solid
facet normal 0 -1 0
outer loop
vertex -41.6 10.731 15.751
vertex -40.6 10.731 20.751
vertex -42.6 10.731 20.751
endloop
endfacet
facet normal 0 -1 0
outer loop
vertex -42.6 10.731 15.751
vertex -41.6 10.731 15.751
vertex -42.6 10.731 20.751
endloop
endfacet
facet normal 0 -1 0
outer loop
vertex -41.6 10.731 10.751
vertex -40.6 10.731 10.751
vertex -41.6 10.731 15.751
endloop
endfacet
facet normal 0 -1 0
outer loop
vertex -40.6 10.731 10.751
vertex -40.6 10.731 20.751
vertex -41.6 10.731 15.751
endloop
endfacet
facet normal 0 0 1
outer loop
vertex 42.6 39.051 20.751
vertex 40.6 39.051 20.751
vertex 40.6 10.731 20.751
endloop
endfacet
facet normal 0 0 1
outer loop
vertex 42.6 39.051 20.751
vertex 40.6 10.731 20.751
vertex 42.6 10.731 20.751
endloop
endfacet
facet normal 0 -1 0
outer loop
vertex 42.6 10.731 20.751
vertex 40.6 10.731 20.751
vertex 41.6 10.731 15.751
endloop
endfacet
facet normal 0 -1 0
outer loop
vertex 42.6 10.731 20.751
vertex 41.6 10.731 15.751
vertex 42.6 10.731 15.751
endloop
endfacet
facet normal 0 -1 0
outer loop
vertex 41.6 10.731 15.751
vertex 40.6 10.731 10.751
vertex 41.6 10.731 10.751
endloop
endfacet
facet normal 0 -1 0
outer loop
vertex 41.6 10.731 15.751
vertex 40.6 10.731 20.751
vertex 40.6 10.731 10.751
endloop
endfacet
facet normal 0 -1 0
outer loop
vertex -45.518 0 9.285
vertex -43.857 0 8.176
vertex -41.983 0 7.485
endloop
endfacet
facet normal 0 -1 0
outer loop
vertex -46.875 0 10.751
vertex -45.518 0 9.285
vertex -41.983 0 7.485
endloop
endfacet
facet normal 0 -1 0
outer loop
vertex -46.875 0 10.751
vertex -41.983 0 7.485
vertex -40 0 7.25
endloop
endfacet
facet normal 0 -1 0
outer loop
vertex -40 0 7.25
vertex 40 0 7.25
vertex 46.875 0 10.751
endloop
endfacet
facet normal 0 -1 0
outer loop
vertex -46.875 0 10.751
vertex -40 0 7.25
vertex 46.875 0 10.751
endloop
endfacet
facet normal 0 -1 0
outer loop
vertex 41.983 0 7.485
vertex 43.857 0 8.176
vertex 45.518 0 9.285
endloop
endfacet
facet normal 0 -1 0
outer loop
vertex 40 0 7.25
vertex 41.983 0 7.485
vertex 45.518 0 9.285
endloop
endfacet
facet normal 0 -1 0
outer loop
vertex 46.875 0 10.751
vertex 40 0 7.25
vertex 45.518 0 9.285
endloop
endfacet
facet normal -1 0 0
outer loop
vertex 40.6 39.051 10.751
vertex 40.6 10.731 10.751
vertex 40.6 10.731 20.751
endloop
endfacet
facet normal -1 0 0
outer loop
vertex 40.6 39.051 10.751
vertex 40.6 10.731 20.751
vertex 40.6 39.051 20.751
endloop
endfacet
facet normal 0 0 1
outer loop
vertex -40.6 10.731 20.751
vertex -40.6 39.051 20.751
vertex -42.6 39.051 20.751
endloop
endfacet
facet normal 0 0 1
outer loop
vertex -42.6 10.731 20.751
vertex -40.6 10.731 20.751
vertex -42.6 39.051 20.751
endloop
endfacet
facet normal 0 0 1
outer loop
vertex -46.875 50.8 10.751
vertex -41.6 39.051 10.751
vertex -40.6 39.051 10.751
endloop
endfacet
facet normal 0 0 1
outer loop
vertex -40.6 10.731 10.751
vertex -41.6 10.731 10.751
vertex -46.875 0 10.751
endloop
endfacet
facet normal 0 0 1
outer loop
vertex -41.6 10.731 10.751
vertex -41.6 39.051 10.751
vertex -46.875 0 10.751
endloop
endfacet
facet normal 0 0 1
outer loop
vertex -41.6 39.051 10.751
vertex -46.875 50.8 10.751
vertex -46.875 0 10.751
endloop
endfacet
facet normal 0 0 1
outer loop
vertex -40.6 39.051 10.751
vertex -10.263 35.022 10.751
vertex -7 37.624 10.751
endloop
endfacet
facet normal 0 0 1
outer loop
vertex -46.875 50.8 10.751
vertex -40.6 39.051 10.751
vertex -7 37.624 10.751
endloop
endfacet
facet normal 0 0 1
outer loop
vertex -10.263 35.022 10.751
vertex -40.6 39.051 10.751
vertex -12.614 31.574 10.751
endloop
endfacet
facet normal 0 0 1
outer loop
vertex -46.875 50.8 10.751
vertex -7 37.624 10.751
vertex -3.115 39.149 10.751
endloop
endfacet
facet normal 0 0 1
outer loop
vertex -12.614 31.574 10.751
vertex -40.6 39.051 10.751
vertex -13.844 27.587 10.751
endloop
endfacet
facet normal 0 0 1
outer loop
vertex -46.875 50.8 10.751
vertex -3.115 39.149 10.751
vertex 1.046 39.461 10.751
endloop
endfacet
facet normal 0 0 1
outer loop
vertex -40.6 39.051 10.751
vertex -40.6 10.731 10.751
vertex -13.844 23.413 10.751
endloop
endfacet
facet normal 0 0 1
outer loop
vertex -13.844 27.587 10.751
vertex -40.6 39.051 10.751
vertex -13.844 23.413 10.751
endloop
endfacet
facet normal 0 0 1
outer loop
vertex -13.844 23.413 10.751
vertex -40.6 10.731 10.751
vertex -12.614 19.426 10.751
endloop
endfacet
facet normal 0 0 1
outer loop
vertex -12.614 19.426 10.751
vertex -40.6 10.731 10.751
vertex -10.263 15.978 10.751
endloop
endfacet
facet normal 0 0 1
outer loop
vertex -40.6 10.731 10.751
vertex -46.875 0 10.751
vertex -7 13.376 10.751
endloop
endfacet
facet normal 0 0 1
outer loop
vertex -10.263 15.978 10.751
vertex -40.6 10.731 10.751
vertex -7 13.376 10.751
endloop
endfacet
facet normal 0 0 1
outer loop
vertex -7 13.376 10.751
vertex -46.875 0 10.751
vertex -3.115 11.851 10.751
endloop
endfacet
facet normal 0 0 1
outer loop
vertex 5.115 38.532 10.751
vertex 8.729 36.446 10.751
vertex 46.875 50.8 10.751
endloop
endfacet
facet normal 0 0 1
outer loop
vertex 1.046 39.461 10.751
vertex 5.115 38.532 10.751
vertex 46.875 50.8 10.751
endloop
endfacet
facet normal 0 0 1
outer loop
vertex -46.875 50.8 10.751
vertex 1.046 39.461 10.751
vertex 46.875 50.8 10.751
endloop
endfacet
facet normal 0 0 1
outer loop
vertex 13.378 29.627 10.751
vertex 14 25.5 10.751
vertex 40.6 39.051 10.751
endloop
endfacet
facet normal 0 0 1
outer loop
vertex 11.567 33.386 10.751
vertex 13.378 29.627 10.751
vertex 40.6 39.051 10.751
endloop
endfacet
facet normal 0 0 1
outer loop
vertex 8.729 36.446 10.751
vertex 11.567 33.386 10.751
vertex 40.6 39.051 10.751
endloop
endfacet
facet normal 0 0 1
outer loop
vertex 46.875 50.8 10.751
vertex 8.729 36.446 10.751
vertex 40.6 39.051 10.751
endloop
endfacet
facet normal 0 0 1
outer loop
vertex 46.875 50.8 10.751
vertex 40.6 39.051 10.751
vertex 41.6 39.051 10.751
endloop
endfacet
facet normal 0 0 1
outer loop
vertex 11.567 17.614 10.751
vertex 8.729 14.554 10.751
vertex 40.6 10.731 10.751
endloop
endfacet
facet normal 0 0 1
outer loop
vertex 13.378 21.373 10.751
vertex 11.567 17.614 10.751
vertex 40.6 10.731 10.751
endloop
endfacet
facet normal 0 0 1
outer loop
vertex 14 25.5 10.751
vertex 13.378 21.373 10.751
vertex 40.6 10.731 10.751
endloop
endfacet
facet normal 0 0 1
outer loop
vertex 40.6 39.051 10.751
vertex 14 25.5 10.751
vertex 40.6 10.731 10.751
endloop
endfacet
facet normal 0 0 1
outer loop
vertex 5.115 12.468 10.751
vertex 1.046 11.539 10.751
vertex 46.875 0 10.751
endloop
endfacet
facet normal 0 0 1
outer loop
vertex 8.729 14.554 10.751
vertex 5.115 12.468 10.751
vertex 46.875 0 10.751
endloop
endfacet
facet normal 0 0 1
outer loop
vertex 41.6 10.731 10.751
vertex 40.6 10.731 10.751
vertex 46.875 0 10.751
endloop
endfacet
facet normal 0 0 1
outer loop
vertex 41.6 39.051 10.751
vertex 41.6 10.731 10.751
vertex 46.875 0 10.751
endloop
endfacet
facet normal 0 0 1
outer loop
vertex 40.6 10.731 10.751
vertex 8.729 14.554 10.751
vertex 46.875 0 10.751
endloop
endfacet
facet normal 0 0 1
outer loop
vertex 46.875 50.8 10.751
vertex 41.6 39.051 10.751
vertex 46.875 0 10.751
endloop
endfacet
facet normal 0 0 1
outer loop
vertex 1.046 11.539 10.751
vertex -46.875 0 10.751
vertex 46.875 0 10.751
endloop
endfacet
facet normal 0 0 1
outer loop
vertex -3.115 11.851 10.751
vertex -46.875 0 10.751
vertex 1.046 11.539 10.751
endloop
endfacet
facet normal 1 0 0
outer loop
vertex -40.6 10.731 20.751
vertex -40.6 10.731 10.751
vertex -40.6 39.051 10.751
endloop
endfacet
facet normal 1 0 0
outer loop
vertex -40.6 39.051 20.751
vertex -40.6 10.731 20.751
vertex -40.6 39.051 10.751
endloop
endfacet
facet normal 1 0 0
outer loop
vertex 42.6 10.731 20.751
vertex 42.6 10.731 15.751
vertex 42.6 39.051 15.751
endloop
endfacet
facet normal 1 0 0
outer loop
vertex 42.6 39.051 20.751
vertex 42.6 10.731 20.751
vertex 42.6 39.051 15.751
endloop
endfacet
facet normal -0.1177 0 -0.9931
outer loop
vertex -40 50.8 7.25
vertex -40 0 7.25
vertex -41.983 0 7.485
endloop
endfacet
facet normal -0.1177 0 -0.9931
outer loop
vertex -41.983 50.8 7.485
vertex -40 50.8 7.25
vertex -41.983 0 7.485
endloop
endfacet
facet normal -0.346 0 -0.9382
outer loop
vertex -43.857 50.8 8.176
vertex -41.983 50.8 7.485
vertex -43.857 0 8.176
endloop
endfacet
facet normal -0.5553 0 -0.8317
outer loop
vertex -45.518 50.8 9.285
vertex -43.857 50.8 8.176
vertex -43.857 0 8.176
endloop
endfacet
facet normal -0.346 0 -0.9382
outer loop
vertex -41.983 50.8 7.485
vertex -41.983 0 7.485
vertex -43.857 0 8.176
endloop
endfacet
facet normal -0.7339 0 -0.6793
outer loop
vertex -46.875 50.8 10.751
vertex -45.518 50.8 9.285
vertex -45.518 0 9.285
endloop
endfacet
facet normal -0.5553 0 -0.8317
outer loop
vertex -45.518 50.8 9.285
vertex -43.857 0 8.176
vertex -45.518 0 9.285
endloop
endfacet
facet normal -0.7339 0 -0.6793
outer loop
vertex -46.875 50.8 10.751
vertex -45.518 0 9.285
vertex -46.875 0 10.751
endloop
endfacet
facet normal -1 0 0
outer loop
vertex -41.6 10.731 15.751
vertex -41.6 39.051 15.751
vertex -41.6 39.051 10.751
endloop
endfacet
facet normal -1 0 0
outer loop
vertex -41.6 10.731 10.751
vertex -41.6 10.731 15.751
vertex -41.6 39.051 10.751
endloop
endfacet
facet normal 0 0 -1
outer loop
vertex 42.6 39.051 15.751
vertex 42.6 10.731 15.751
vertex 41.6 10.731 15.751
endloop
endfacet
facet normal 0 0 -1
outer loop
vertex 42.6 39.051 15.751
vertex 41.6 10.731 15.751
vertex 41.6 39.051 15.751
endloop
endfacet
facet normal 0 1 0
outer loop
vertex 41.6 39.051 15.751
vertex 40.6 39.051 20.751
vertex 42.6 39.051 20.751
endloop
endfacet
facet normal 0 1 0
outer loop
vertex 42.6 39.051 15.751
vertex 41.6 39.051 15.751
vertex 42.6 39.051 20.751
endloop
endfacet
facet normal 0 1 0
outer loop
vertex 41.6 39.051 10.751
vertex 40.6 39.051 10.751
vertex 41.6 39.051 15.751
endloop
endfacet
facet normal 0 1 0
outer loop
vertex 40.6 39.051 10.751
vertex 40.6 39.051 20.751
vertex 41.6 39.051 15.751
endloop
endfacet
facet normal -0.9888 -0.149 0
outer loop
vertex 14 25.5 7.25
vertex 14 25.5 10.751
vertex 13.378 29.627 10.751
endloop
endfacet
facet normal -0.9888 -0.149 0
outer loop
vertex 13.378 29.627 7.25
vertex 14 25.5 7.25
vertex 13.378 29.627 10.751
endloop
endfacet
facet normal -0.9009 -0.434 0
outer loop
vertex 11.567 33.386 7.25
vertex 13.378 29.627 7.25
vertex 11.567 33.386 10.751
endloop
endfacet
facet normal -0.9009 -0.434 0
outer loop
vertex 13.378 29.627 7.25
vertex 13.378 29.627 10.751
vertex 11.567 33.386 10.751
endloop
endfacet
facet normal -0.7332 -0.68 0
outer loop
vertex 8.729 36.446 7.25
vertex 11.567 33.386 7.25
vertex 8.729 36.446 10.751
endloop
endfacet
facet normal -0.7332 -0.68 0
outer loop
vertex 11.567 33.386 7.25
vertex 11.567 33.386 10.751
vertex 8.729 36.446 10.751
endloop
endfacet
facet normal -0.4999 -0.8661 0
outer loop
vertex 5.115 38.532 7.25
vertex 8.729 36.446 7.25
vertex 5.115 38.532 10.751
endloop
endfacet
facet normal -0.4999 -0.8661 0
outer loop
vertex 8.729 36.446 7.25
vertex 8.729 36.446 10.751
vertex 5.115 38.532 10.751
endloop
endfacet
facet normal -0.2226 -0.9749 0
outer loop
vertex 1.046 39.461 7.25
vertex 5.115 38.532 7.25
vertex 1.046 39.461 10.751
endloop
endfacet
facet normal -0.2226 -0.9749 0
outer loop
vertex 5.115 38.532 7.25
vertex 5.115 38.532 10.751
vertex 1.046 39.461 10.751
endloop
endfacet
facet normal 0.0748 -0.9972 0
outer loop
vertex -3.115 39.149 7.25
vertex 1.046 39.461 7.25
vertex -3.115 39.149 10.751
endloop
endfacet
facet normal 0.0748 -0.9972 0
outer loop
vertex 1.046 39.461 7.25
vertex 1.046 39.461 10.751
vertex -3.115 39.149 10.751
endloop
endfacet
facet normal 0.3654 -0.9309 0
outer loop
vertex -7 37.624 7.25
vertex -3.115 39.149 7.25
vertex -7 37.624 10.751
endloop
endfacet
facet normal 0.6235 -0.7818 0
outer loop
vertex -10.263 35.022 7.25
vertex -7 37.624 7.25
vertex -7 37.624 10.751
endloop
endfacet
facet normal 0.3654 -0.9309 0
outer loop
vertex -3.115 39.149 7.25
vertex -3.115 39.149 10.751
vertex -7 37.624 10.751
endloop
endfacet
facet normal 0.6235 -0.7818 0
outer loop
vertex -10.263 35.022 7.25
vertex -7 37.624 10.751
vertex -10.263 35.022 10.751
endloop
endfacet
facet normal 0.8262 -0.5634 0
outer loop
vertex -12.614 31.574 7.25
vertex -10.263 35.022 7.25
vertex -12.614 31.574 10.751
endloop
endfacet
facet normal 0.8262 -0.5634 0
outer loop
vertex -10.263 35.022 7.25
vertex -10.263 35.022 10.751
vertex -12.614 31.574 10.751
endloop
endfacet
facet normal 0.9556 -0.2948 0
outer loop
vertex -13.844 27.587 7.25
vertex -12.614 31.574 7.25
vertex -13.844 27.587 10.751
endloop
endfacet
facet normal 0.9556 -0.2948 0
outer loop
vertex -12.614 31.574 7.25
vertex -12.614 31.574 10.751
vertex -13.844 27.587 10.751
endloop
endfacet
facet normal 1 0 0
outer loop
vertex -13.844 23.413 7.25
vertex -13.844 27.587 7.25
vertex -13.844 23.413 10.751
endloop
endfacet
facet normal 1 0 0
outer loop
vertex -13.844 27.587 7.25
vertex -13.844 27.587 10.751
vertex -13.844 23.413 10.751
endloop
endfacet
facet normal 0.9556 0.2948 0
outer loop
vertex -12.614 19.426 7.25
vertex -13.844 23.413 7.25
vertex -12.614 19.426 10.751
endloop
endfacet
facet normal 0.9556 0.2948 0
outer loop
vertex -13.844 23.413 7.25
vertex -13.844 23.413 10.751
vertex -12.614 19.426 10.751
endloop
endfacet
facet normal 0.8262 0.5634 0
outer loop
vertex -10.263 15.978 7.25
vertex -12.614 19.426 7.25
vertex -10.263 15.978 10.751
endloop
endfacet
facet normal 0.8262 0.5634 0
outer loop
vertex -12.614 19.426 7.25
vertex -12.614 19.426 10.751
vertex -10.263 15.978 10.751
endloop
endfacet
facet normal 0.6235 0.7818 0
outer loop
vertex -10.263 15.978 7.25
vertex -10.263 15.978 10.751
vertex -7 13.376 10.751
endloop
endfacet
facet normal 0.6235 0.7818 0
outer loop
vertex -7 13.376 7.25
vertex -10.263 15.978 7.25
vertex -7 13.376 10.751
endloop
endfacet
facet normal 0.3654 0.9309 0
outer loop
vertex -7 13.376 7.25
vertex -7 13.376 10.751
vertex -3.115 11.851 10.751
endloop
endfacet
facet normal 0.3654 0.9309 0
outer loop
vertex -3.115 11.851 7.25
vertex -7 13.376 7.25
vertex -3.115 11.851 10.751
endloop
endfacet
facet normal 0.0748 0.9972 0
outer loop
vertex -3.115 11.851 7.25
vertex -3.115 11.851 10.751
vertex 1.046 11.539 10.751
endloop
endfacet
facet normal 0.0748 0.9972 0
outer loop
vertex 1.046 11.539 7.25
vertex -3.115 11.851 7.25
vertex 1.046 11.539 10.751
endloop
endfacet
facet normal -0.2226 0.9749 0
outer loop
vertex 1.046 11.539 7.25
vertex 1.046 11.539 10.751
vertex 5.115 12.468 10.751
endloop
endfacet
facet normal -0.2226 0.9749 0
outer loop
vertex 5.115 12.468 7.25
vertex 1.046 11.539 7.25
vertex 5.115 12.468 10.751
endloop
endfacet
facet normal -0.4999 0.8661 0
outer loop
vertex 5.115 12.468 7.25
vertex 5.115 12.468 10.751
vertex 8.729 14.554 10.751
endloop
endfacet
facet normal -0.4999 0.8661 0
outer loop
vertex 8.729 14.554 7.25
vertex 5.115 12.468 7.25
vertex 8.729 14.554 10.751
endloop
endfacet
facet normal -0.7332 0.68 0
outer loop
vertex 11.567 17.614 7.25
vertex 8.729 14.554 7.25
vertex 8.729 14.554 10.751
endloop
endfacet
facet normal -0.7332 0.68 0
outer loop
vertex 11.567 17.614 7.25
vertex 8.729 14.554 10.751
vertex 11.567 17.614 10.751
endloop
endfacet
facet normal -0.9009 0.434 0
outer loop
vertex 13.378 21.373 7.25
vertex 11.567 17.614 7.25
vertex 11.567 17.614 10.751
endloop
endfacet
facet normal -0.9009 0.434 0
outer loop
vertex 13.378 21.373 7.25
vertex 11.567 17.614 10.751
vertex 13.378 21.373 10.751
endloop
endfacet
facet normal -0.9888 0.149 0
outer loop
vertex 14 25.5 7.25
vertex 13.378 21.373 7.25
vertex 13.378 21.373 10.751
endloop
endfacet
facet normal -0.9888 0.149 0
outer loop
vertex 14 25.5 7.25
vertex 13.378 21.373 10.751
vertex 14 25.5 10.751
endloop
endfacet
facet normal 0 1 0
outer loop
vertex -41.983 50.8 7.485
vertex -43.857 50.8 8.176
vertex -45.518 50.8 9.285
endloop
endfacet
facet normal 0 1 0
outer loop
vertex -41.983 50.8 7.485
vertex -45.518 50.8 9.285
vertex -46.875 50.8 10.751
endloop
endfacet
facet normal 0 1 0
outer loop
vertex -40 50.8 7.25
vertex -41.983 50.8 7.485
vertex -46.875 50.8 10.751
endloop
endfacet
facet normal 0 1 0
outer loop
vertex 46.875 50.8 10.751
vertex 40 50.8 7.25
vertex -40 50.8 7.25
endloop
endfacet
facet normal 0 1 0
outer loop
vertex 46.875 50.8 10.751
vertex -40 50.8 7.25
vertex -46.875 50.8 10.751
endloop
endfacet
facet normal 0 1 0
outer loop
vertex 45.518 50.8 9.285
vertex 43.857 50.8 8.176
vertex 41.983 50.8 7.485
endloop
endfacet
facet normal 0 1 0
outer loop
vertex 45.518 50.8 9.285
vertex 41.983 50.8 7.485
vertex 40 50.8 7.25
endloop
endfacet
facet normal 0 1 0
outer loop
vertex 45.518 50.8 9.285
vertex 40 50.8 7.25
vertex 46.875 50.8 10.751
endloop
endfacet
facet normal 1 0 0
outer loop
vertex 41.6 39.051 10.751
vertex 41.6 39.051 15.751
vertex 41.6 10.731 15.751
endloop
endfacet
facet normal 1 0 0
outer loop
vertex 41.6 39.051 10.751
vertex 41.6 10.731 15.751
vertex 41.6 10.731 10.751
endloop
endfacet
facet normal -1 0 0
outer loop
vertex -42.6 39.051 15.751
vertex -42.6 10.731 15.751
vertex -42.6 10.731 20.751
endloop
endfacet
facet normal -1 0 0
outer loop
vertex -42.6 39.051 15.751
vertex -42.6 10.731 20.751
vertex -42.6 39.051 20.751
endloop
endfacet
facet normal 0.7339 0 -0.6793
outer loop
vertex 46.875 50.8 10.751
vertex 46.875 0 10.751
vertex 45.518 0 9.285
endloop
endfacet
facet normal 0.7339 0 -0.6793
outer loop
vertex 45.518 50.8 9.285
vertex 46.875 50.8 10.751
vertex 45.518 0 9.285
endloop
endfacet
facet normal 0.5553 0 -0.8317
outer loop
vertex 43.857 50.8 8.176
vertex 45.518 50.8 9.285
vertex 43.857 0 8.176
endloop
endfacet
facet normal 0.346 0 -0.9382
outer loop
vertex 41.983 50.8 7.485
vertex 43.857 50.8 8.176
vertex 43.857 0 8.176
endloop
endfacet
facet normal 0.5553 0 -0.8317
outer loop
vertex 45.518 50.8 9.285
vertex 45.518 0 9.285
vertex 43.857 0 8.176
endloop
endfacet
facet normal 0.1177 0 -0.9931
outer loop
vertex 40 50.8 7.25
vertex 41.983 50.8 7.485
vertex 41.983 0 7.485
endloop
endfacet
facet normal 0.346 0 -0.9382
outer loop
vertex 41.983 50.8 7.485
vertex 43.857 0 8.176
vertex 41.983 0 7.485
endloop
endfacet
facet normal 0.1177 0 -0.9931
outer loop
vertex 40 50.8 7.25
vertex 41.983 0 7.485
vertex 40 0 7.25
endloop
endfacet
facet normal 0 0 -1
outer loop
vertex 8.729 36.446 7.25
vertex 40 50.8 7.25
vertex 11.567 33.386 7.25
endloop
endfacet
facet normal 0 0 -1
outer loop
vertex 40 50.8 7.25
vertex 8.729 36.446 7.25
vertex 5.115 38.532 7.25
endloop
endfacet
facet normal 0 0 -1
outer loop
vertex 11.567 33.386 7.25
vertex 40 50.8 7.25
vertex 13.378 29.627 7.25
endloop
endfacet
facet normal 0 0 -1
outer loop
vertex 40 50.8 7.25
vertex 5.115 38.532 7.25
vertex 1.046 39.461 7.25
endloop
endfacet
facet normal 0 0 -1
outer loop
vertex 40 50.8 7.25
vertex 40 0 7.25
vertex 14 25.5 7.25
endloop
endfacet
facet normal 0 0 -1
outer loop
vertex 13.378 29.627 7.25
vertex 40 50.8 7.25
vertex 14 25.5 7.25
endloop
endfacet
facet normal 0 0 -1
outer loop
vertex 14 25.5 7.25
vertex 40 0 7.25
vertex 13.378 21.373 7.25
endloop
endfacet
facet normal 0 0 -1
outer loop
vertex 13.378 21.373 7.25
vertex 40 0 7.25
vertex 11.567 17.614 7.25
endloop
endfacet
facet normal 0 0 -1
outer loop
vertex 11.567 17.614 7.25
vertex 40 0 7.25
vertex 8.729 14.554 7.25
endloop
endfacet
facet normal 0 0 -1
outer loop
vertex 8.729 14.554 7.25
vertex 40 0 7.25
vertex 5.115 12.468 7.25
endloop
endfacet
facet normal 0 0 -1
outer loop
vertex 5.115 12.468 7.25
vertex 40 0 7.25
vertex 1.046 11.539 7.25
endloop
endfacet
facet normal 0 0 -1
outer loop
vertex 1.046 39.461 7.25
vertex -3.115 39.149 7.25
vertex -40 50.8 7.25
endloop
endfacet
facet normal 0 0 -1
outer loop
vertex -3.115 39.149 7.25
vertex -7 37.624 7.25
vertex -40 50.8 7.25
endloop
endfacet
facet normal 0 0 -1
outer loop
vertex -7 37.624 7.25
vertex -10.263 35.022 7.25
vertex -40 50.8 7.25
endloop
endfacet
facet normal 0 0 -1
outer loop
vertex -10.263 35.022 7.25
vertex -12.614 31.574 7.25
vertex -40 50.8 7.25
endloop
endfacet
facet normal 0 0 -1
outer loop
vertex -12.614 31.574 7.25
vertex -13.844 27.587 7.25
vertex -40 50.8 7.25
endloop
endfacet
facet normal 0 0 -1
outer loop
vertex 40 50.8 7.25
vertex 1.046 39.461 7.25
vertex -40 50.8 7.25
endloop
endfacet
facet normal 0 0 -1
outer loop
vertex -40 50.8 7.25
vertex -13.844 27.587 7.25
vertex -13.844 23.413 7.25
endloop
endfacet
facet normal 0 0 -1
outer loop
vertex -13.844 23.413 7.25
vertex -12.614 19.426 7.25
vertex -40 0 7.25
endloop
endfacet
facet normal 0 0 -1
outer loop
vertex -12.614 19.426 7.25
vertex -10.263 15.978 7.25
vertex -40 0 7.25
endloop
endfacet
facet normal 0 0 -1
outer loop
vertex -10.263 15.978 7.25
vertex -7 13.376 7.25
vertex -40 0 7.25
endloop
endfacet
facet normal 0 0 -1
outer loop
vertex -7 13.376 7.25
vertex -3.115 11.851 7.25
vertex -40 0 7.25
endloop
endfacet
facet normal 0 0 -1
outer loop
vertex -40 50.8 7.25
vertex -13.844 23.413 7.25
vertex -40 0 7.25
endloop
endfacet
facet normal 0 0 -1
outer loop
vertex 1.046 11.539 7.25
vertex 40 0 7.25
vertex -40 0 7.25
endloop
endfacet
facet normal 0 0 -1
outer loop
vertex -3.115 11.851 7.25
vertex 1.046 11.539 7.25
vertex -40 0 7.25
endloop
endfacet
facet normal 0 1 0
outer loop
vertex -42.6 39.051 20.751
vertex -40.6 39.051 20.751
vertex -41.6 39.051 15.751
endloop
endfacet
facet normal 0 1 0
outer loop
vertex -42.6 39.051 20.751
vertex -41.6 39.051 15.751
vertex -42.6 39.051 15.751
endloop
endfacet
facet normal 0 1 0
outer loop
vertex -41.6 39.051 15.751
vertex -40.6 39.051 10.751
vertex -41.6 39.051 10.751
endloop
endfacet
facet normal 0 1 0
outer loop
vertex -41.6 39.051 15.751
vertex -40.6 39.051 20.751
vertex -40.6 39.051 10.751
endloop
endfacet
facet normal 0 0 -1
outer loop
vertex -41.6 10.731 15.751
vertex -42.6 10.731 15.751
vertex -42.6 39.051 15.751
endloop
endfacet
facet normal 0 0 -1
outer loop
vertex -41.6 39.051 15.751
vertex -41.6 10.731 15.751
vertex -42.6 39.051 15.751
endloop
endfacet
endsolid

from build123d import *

# Parameters (mm, degrees)
BOSS_EXTRUDE1_DEPTH = 50.8
SKETCH4_W           = 2
SKETCH4_H           = 28.319341289
BOSS_EXTRUDE2_DEPTH = 10
SKETCH5_W           = 5
SKETCH5_H           = 28.319341289
CUT_EXTRUDE2_DEPTH  = 1
SKETCH8_R           = 14
CUT_EXTRUDE3_DEPTH  = 70.841706276


with BuildPart() as part:
    # Sketch1 → Boss-Extrude1 (new body)
    with BuildSketch(Plane(origin=(0, 0, 0), x_dir=(1, 0, 0), z_dir=(0, 1, 0))):
        with BuildLine():
            Line((-46.87455531, -10.750952702), (46.87455531, -10.750952702))
            ThreePointArc((46.87455531, -10.750952702), (43.857336275, -8.175639398), (40, -7.250001141))
            Line((40, -7.250001141), (-40, -7.250001141))
            ThreePointArc((-40, -7.250001141), (-43.857336275, -8.175639398), (-46.87455531, -10.750952702))
        make_face()
    extrude(amount=BOSS_EXTRUDE1_DEPTH)

    # Sketch4 → Boss-Extrude2 (add)
    with BuildSketch(Plane.XY.offset(10.750952702)):
        with Locations((41.6, 24.891155304)):
            Rectangle(SKETCH4_W, SKETCH4_H)
    boss_extrude2 = extrude(amount=BOSS_EXTRUDE2_DEPTH)

    # Sketch5 → Cut-Extrude2 (cut)
    with BuildSketch(Plane(origin=(42.6, 0, 0), x_dir=(0, 0, -1), z_dir=(1, 0, 0))):
        with Locations((-13.250952702, 24.891155304)):
            Rectangle(SKETCH5_W, SKETCH5_H)
    cut_extrude2 = extrude(amount=-CUT_EXTRUDE2_DEPTH, mode=Mode.SUBTRACT)

    # Mirror1: Boss-Extrude2, Cut-Extrude2 across plane
    add(boss_extrude2.mirror(Plane(origin=(0, 0, 0), x_dir=(0, 0, 1), z_dir=(1, 0, 0))))
    add(cut_extrude2.mirror(Plane(origin=(0, 0, 0), x_dir=(0, 0, 1), z_dir=(1, 0, 0))), mode=Mode.SUBTRACT)

    # Sketch8 → Cut-Extrude3 (cut, through all)
    with BuildSketch(Plane.XY.offset(10.750952702)):
        with Locations((0, 25.5)):
            Circle(SKETCH8_R)
    extrude(amount=-CUT_EXTRUDE3_DEPTH, mode=Mode.SUBTRACT)


solid = part.part
